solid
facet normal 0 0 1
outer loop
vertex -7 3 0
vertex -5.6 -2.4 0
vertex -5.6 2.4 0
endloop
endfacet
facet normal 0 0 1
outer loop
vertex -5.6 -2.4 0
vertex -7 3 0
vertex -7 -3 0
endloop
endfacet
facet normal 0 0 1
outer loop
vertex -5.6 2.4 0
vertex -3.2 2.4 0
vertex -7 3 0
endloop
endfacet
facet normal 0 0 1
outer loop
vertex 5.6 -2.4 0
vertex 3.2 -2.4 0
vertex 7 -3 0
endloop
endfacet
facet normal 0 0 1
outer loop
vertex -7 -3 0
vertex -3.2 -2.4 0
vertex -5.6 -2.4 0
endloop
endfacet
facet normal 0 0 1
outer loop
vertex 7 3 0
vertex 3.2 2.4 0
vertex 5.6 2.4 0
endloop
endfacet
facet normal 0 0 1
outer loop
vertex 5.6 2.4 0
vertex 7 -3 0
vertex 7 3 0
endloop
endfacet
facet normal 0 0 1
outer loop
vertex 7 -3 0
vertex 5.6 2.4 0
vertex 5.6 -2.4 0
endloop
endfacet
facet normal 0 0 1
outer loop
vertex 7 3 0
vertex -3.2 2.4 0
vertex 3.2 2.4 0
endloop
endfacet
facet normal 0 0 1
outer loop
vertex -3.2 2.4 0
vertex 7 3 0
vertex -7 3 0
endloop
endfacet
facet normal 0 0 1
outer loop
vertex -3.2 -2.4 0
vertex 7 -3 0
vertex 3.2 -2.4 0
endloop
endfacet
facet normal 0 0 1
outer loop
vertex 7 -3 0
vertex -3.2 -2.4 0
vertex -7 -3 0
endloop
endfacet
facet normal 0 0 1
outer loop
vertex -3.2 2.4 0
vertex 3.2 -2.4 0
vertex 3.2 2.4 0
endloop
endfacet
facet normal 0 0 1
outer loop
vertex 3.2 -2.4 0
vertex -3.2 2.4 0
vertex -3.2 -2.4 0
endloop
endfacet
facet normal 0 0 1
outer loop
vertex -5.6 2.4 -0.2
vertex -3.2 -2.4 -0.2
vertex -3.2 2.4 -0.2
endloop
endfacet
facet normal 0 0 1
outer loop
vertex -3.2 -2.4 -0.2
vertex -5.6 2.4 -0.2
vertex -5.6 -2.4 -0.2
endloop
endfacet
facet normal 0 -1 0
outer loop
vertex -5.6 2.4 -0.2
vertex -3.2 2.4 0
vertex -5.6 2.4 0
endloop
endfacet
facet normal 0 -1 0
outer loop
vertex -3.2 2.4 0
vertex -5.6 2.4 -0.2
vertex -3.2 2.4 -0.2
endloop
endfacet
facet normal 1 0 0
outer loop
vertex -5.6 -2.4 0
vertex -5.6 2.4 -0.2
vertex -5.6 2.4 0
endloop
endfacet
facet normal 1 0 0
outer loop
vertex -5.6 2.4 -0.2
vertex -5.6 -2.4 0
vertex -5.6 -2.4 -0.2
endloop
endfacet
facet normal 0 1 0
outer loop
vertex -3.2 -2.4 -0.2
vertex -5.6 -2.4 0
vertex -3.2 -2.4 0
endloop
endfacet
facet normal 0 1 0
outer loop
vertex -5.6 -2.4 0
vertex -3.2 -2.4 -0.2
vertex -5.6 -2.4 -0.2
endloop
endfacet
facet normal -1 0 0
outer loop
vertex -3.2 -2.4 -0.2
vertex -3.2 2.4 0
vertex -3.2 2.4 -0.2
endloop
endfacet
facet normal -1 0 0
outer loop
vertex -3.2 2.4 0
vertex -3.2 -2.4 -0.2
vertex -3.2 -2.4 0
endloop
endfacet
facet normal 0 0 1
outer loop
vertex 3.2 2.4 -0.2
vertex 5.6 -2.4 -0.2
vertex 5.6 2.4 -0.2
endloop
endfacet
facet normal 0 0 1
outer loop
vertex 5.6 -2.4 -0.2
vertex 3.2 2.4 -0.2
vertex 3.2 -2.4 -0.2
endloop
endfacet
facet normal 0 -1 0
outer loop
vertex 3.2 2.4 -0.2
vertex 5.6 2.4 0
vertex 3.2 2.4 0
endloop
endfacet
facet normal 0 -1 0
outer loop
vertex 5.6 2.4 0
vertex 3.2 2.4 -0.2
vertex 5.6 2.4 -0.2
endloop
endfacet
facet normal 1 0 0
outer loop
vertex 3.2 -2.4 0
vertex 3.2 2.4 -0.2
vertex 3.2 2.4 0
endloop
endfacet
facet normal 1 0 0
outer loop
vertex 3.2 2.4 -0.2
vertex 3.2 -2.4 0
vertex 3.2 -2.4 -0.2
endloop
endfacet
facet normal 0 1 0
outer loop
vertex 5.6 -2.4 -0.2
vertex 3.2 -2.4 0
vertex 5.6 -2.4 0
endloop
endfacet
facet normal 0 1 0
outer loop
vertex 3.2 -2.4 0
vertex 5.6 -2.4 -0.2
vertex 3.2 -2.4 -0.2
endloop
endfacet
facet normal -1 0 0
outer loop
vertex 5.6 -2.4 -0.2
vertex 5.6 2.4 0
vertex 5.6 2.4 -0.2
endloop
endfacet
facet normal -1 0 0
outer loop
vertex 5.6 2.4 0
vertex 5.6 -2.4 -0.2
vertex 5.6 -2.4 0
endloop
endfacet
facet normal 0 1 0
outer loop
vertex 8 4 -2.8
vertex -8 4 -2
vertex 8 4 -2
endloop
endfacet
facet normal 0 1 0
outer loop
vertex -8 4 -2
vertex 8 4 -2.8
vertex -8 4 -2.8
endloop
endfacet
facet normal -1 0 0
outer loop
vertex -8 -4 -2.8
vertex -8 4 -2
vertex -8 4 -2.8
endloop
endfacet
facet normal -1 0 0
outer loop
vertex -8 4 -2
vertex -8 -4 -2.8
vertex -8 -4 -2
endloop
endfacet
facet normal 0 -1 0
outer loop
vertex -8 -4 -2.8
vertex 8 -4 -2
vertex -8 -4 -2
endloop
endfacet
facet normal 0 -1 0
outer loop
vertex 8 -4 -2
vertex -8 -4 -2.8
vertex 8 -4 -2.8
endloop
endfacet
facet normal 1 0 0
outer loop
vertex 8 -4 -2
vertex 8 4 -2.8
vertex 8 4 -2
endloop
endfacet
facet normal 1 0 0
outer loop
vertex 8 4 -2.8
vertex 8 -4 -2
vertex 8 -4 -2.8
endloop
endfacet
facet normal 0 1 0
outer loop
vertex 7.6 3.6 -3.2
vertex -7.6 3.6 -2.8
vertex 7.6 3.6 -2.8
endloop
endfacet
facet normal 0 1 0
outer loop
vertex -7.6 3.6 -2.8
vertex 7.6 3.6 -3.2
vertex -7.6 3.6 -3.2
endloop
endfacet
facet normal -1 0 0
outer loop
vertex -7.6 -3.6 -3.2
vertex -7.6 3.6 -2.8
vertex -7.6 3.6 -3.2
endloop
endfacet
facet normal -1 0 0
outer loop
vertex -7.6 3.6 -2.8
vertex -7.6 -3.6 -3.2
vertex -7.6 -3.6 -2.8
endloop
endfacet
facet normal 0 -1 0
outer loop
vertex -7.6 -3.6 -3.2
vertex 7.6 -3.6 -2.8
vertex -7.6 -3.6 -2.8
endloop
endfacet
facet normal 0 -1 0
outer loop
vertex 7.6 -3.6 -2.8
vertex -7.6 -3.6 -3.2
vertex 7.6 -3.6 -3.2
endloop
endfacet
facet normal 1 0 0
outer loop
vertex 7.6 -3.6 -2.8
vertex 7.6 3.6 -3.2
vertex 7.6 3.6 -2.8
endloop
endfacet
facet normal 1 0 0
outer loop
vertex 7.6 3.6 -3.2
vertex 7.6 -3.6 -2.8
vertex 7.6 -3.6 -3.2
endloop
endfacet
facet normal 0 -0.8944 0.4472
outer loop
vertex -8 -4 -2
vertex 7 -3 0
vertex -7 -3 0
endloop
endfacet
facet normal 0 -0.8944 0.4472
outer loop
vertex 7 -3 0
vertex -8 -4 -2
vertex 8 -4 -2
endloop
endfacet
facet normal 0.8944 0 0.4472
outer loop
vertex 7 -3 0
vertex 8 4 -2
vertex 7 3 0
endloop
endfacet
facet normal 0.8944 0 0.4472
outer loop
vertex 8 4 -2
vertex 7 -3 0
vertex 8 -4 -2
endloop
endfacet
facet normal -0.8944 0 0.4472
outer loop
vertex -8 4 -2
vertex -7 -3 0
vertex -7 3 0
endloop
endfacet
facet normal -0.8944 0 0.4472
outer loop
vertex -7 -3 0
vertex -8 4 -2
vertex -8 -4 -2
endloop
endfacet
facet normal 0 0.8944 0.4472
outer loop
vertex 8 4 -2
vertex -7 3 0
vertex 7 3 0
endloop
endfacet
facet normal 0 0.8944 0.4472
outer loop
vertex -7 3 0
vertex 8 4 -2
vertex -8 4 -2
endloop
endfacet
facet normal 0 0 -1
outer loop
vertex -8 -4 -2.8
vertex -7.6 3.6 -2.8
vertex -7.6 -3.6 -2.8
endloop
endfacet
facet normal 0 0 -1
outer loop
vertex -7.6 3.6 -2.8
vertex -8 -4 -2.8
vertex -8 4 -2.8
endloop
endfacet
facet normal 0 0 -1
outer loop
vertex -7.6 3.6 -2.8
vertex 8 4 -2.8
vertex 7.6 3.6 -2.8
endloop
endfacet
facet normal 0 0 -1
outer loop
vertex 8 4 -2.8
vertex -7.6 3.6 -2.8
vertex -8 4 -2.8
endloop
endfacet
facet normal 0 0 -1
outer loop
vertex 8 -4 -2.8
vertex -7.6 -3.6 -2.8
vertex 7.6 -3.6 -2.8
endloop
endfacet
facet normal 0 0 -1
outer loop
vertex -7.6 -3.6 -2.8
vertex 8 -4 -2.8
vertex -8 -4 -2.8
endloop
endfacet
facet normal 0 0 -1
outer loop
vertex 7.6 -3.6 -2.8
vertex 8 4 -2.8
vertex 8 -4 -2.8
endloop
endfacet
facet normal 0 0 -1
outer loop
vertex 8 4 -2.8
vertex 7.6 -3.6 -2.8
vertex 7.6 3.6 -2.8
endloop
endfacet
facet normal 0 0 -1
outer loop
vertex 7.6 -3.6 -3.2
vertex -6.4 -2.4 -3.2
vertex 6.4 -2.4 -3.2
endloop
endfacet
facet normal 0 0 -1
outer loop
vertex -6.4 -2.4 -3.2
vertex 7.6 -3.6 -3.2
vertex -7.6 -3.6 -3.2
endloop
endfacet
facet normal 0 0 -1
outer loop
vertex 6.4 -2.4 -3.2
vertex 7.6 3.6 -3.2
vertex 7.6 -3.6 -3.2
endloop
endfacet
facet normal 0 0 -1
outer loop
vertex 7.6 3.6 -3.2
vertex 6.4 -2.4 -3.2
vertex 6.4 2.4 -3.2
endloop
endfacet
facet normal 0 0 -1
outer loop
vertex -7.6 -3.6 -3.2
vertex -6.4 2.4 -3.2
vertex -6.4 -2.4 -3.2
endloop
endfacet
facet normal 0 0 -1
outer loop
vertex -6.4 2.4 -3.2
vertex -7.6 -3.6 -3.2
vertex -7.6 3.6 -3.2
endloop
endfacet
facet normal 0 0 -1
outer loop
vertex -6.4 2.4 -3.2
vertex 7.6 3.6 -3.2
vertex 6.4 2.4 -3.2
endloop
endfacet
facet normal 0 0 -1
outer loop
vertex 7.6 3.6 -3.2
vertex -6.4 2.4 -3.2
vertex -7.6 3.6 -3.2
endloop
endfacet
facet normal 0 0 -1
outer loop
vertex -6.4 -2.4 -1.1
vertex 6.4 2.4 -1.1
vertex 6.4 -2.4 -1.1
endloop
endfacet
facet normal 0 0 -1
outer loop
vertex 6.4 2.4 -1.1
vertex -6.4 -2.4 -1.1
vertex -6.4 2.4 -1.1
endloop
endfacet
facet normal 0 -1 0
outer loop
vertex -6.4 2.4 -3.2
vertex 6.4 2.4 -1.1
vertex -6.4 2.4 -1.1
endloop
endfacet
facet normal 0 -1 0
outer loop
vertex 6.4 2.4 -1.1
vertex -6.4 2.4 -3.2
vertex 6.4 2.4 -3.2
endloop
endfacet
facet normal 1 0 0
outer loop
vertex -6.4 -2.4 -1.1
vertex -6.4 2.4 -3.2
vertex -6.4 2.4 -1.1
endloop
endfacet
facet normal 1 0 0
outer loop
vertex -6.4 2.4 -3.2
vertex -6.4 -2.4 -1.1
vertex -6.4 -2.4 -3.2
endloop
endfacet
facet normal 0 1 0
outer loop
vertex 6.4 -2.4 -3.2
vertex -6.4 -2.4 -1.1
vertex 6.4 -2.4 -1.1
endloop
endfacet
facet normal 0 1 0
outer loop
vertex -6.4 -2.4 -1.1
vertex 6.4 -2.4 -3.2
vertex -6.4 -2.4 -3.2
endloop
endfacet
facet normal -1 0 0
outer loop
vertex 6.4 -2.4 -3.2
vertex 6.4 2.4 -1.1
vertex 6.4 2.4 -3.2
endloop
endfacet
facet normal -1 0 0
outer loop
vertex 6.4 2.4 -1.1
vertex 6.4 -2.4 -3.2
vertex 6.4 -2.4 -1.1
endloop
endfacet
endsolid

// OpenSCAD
// file: ../p/box5.scad
use <../lib.scad>
function ldraw_lib__box5() = [
// 0 Box with 5 Faces and All Edges
// 0 Name: box5.dat
// 0 Author: James Jessiman
// 0 !LDRAW_ORG Primitive UPDATE 2012-01
// 0 !LICENSE Licensed under CC BY 2.0 and CC BY 4.0 : see CAreadme.txt
// 
// 0 BFC CERTIFY CCW
  [0,"BFC","CERTIFY"],
  [0,"BFC","CCW"],
// 
// 0 !HISTORY 2002-04-03 [sbliss] Modified for BFC compliance
// 0 !HISTORY 2002-04-25 [PTadmin] Official Update 2002-02
// 0 !HISTORY 2007-06-24 [PTadmin] Header formatted for Contributor Agreement
// 0 !HISTORY 2008-07-01 [PTadmin] Official Update 2008-01
// 0 !HISTORY 2012-02-16 [Philo] Changed to CCW
// 0 !HISTORY 2012-03-30 [PTadmin] Official Update 2012-01
// 
// 
// 2 24 1 1 1 -1 1 1
  [2,24,1,1,1,-1,1,1],
// 2 24 -1 1 1 -1 1 -1
  [2,24,-1,1,1,-1,1,-1],
// 2 24 -1 1 -1 1 1 -1
  [2,24,-1,1,-1,1,1,-1],
// 2 24 1 1 -1 1 1 1
  [2,24,1,1,-1,1,1,1],
// 2 24 1 0 1 -1 0 1
  [2,24,1,0,1,-1,0,1],
// 2 24 -1 0 1 -1 0 -1
  [2,24,-1,0,1,-1,0,-1],
// 2 24 -1 0 -1 1 0 -1
  [2,24,-1,0,-1,1,0,-1],
// 2 24 1 0 -1 1 0 1
  [2,24,1,0,-1,1,0,1],
// 2 24 1 0 1 1 1 1
  [2,24,1,0,1,1,1,1],
// 2 24 -1 0 1 -1 1 1
  [2,24,-1,0,1,-1,1,1],
// 2 24 1 0 -1 1 1 -1
  [2,24,1,0,-1,1,1,-1],
// 2 24 -1 0 -1 -1 1 -1
  [2,24,-1,0,-1,-1,1,-1],
// 4 16 -1 1 1 1 1 1 1 1 -1 -1 1 -1
  [4,16,-1,1,1,1,1,1,1,1,-1,-1,1,-1],
// 4 16 -1 1 1 -1 0 1 1 0 1 1 1 1
  [4,16,-1,1,1,-1,0,1,1,0,1,1,1,1],
// 4 16 -1 1 -1 -1 0 -1 -1 0 1 -1 1 1
  [4,16,-1,1,-1,-1,0,-1,-1,0,1,-1,1,1],
// 4 16 1 1 -1 1 0 -1 -1 0 -1 -1 1 -1
  [4,16,1,1,-1,1,0,-1,-1,0,-1,-1,1,-1],
// 4 16 1 1 1 1 0 1 1 0 -1 1 1 -1
  [4,16,1,1,1,1,0,1,1,0,-1,1,1,-1],
];
makepoly(ldraw_lib__box5(), line=0.2);
// file: ../p/box4.scad
use <../lib.scad>
function ldraw_lib__box4() = [
// 0 Box with 4 Faces (2 Parallel Pairs) and All Edges
// 0 Name: box4.dat
// 0 Author: James Jessiman
// 0 !LDRAW_ORG Primitive UPDATE 2012-01
// 0 !LICENSE Licensed under CC BY 2.0 and CC BY 4.0 : see CAreadme.txt
// 
// 0 BFC CERTIFY CCW
  [0,"BFC","CERTIFY"],
  [0,"BFC","CCW"],
// 
// 0 !HISTORY 2002-04-03 [sbliss] Modified for BFC compliance
// 0 !HISTORY 2002-04-25 [PTadmin] Official Update 2002-02
// 0 !HISTORY 2007-06-24 [PTadmin] Header formatted for Contributor Agreement
// 0 !HISTORY 2008-07-01 [PTadmin] Official Update 2008-01
// 0 !HISTORY 2012-02-16 [Philo] Changed to CCW
// 0 !HISTORY 2012-03-30 [PTadmin] Official Update 2012-01
// 
// 
// 2 24 1 1 1 -1 1 1
  [2,24,1,1,1,-1,1,1],
// 2 24 -1 1 1 -1 1 -1
  [2,24,-1,1,1,-1,1,-1],
// 2 24 -1 1 -1 1 1 -1
  [2,24,-1,1,-1,1,1,-1],
// 2 24 1 1 -1 1 1 1
  [2,24,1,1,-1,1,1,1],
// 2 24 1 0 1 -1 0 1
  [2,24,1,0,1,-1,0,1],
// 2 24 -1 0 1 -1 0 -1
  [2,24,-1,0,1,-1,0,-1],
// 2 24 -1 0 -1 1 0 -1
  [2,24,-1,0,-1,1,0,-1],
// 2 24 1 0 -1 1 0 1
  [2,24,1,0,-1,1,0,1],
// 2 24 1 0 1 1 1 1
  [2,24,1,0,1,1,1,1],
// 2 24 -1 0 1 -1 1 1
  [2,24,-1,0,1,-1,1,1],
// 2 24 1 0 -1 1 1 -1
  [2,24,1,0,-1,1,1,-1],
// 2 24 -1 0 -1 -1 1 -1
  [2,24,-1,0,-1,-1,1,-1],
// 4 16 -1 1 1 -1 0 1 1 0 1 1 1 1
  [4,16,-1,1,1,-1,0,1,1,0,1,1,1,1],
// 4 16 -1 1 -1 -1 0 -1 -1 0 1 -1 1 1
  [4,16,-1,1,-1,-1,0,-1,-1,0,1,-1,1,1],
// 4 16 1 1 -1 1 0 -1 -1 0 -1 -1 1 -1
  [4,16,1,1,-1,1,0,-1,-1,0,-1,-1,1,-1],
// 4 16 1 1 1 1 0 1 1 0 -1 1 1 -1
  [4,16,1,1,1,1,0,1,1,0,-1,1,1,-1],
];
makepoly(ldraw_lib__box4(), line=0.2);
// file: 96910.scad
use <../lib.scad>
use <../p/box4.scad>
use <../p/box5.scad>
function ldraw_lib__96910() = [
// 0 Tile  1 x  2 Chamfered with 2 Top Indentations
// 0 Name: 96910.dat
// 0 Author: Stan Isachenko [angmarec]
// 0 !LDRAW_ORG Part UPDATE 2019-01
// 0 !LICENSE Licensed under CC BY 2.0 and CC BY 4.0 : see CAreadme.txt
// 
// 0 BFC CERTIFY CCW
  [0,"BFC","CERTIFY"],
  [0,"BFC","CCW"],
// 
// 0 !KEYWORDS bullion, Fort Knox, gold bar, Gold Ingot, Pirates of the Caribbean
// 0 !KEYWORDS treasure
// 
// 0 !CMDLINE -c334
// 
// 0 !HISTORY 2012-01-18 {LEGO Digital Designer} Original part shape
// 0 !HISTORY 2012-01-19 [angmarec] File preparation for LDraw Parts Tracker
// 0 !HISTORY 2012-04-22 [Steffen] added top dents, removed condlines, changed bottom groove, changed origin
// 0 !HISTORY 2012-12-28 [PTadmin] Official Update 2012-03
// 0 !HISTORY 2018-12-29 [cwdee] Retitled
// 0 !HISTORY 2019-06-28 [PTadmin] Official Update 2019-01
// 
// 
// 4 16 -17.5 0 -7.5 -14 0 -6 -14 0 6 -17.5 0 7.5
  [4,16,-17.5,0,-7.5,-14,0,-6,-14,0,6,-17.5,0,7.5],
// 3 16 -14 0 6 -8 0 6 -17.5 0 7.5
  [3,16,-14,0,6,-8,0,6,-17.5,0,7.5],
// 3 16 14 0 -6 8 0 -6 17.5 0 -7.5
  [3,16,14,0,-6,8,0,-6,17.5,0,-7.5],
// 3 16 -17.5 0 -7.5 -8 0 -6 -14 0 -6
  [3,16,-17.5,0,-7.5,-8,0,-6,-14,0,-6],
// 3 16 17.5 0 7.5 8 0 6 14 0 6
  [3,16,17.5,0,7.5,8,0,6,14,0,6],
// 4 16 17.5 0 7.5 14 0 6 14 0 -6 17.5 0 -7.5
  [4,16,17.5,0,7.5,14,0,6,14,0,-6,17.5,0,-7.5],
// 4 16 -17.5 0 7.5 -8 0 6 8 0 6 17.5 0 7.5
  [4,16,-17.5,0,7.5,-8,0,6,8,0,6,17.5,0,7.5],
// 4 16 17.5 0 -7.5 8 0 -6 -8 0 -6 -17.5 0 -7.5
  [4,16,17.5,0,-7.5,8,0,-6,-8,0,-6,-17.5,0,-7.5],
// 4 16 -8 0 6 -8 0 -6 8 0 -6 8 0 6
  [4,16,-8,0,6,-8,0,-6,8,0,-6,8,0,6],
// 0 BFC INVERTNEXT
  [0,"BFC","INVERTNEXT"],
// 1 16 -11 0 0 3 0 0 0 0.5 0 0 0 6 box5.dat
  [1,16,-11,0,0,3,0,0,0,0.5,0,0,0,6, ldraw_lib__box5()],
// 0 BFC INVERTNEXT
  [0,"BFC","INVERTNEXT"],
// 1 16 11 0 0 3 0 0 0 0.5 0 0 0 6 box5.dat
  [1,16,11,0,0,3,0,0,0,0.5,0,0,0,6, ldraw_lib__box5()],
// 1 16 0 5 0 20 0 0 0 2 0 0 0 10 box4.dat
  [1,16,0,5,0,20,0,0,0,2,0,0,0,10, ldraw_lib__box4()],
// 1 16 0 7 0 19 0 0 0 1 0 0 0 9 box4.dat
  [1,16,0,7,0,19,0,0,0,1,0,0,0,9, ldraw_lib__box4()],
// 4 16 -20 5 -10 20 5 -10 17.5 0 -7.5 -17.5 0 -7.5
  [4,16,-20,5,-10,20,5,-10,17.5,0,-7.5,-17.5,0,-7.5],
// 4 16 20 5 -10 20 5 10 17.5 0 7.5 17.5 0 -7.5
  [4,16,20,5,-10,20,5,10,17.5,0,7.5,17.5,0,-7.5],
// 4 16 -20 5 10 -20 5 -10 -17.5 0 -7.5 -17.5 0 7.5
  [4,16,-20,5,10,-20,5,-10,-17.5,0,-7.5,-17.5,0,7.5],
// 4 16 20 5 10 -20 5 10 -17.5 0 7.5 17.5 0 7.5
  [4,16,20,5,10,-20,5,10,-17.5,0,7.5,17.5,0,7.5],
// 4 16 -19 7 -9 -20 7 -10 -20 7 10 -19 7 9
  [4,16,-19,7,-9,-20,7,-10,-20,7,10,-19,7,9],
// 4 16 -19 7 9 -20 7 10 20 7 10 19 7 9
  [4,16,-19,7,9,-20,7,10,20,7,10,19,7,9],
// 4 16 19 7 -9 20 7 -10 -20 7 -10 -19 7 -9
  [4,16,19,7,-9,20,7,-10,-20,7,-10,-19,7,-9],
// 4 16 19 7 9 20 7 10 20 7 -10 19 7 -9
  [4,16,19,7,9,20,7,10,20,7,-10,19,7,-9],
// 4 16 16 8 -6 19 8 -9 -19 8 -9 -16 8 -6
  [4,16,16,8,-6,19,8,-9,-19,8,-9,-16,8,-6],
// 4 16 16 8 6 19 8 9 19 8 -9 16 8 -6
  [4,16,16,8,6,19,8,9,19,8,-9,16,8,-6],
// 4 16 -16 8 -6 -19 8 -9 -19 8 9 -16 8 6
  [4,16,-16,8,-6,-19,8,-9,-19,8,9,-16,8,6],
// 4 16 -16 8 6 -19 8 9 19 8 9 16 8 6
  [4,16,-16,8,6,-19,8,9,19,8,9,16,8,6],
// 2 24 -17.5 0 -7.5 17.5 0 -7.5
  [2,24,-17.5,0,-7.5,17.5,0,-7.5],
// 2 24 17.5 0 -7.5 17.5 0 7.5
  [2,24,17.5,0,-7.5,17.5,0,7.5],
// 2 24 20 5 -10 17.5 0 -7.5
  [2,24,20,5,-10,17.5,0,-7.5],
// 2 24 -17.5 0 -7.5 -20 5 -10
  [2,24,-17.5,0,-7.5,-20,5,-10],
// 2 24 20 5 10 17.5 0 7.5
  [2,24,20,5,10,17.5,0,7.5],
// 2 24 -17.5 0 7.5 -17.5 0 -7.5
  [2,24,-17.5,0,7.5,-17.5,0,-7.5],
// 2 24 17.5 0 7.5 -17.5 0 7.5
  [2,24,17.5,0,7.5,-17.5,0,7.5],
// 2 24 -17.5 0 7.5 -20 5 10
  [2,24,-17.5,0,7.5,-20,5,10],
// 0 BFC INVERTNEXT
  [0,"BFC","INVERTNEXT"],
// 1 16 0 8 0 16 0 0 0 -5.25 0 0 0 6 box5.dat
  [1,16,0,8,0,16,0,0,0,-5.25,0,0,0,6, ldraw_lib__box5()],
];
makepoly(ldraw_lib__96910(), line=0.2);
// main file
use <../lib.scad>
use <96910.scad>
function ldraw_lib__99563() = [
// 0 =Tile  1 x  2 Chamfered with 2 Top Indentations
// 0 Name: 99563.dat
// 0 Author: [PTadmin]
// 0 !LDRAW_ORG Part Alias UPDATE 2019-01
// 0 !LICENSE Licensed under CC BY 4.0 : see CAreadme.txt
// 
// 0 BFC CERTIFY CCW
  [0,"BFC","CERTIFY"],
  [0,"BFC","CCW"],
// 
// 0 !HISTORY 2019-06-28 [PTadmin] Official Update 2019-01
// 
// 
// 1 16 0 0 0 1 0 0 0 1 0 0 0 1 96910.dat
  [1,16,0,0,0,1,0,0,0,1,0,0,0,1, ldraw_lib__96910()],
];
makepoly(ldraw_lib__99563(), line=0.2);
